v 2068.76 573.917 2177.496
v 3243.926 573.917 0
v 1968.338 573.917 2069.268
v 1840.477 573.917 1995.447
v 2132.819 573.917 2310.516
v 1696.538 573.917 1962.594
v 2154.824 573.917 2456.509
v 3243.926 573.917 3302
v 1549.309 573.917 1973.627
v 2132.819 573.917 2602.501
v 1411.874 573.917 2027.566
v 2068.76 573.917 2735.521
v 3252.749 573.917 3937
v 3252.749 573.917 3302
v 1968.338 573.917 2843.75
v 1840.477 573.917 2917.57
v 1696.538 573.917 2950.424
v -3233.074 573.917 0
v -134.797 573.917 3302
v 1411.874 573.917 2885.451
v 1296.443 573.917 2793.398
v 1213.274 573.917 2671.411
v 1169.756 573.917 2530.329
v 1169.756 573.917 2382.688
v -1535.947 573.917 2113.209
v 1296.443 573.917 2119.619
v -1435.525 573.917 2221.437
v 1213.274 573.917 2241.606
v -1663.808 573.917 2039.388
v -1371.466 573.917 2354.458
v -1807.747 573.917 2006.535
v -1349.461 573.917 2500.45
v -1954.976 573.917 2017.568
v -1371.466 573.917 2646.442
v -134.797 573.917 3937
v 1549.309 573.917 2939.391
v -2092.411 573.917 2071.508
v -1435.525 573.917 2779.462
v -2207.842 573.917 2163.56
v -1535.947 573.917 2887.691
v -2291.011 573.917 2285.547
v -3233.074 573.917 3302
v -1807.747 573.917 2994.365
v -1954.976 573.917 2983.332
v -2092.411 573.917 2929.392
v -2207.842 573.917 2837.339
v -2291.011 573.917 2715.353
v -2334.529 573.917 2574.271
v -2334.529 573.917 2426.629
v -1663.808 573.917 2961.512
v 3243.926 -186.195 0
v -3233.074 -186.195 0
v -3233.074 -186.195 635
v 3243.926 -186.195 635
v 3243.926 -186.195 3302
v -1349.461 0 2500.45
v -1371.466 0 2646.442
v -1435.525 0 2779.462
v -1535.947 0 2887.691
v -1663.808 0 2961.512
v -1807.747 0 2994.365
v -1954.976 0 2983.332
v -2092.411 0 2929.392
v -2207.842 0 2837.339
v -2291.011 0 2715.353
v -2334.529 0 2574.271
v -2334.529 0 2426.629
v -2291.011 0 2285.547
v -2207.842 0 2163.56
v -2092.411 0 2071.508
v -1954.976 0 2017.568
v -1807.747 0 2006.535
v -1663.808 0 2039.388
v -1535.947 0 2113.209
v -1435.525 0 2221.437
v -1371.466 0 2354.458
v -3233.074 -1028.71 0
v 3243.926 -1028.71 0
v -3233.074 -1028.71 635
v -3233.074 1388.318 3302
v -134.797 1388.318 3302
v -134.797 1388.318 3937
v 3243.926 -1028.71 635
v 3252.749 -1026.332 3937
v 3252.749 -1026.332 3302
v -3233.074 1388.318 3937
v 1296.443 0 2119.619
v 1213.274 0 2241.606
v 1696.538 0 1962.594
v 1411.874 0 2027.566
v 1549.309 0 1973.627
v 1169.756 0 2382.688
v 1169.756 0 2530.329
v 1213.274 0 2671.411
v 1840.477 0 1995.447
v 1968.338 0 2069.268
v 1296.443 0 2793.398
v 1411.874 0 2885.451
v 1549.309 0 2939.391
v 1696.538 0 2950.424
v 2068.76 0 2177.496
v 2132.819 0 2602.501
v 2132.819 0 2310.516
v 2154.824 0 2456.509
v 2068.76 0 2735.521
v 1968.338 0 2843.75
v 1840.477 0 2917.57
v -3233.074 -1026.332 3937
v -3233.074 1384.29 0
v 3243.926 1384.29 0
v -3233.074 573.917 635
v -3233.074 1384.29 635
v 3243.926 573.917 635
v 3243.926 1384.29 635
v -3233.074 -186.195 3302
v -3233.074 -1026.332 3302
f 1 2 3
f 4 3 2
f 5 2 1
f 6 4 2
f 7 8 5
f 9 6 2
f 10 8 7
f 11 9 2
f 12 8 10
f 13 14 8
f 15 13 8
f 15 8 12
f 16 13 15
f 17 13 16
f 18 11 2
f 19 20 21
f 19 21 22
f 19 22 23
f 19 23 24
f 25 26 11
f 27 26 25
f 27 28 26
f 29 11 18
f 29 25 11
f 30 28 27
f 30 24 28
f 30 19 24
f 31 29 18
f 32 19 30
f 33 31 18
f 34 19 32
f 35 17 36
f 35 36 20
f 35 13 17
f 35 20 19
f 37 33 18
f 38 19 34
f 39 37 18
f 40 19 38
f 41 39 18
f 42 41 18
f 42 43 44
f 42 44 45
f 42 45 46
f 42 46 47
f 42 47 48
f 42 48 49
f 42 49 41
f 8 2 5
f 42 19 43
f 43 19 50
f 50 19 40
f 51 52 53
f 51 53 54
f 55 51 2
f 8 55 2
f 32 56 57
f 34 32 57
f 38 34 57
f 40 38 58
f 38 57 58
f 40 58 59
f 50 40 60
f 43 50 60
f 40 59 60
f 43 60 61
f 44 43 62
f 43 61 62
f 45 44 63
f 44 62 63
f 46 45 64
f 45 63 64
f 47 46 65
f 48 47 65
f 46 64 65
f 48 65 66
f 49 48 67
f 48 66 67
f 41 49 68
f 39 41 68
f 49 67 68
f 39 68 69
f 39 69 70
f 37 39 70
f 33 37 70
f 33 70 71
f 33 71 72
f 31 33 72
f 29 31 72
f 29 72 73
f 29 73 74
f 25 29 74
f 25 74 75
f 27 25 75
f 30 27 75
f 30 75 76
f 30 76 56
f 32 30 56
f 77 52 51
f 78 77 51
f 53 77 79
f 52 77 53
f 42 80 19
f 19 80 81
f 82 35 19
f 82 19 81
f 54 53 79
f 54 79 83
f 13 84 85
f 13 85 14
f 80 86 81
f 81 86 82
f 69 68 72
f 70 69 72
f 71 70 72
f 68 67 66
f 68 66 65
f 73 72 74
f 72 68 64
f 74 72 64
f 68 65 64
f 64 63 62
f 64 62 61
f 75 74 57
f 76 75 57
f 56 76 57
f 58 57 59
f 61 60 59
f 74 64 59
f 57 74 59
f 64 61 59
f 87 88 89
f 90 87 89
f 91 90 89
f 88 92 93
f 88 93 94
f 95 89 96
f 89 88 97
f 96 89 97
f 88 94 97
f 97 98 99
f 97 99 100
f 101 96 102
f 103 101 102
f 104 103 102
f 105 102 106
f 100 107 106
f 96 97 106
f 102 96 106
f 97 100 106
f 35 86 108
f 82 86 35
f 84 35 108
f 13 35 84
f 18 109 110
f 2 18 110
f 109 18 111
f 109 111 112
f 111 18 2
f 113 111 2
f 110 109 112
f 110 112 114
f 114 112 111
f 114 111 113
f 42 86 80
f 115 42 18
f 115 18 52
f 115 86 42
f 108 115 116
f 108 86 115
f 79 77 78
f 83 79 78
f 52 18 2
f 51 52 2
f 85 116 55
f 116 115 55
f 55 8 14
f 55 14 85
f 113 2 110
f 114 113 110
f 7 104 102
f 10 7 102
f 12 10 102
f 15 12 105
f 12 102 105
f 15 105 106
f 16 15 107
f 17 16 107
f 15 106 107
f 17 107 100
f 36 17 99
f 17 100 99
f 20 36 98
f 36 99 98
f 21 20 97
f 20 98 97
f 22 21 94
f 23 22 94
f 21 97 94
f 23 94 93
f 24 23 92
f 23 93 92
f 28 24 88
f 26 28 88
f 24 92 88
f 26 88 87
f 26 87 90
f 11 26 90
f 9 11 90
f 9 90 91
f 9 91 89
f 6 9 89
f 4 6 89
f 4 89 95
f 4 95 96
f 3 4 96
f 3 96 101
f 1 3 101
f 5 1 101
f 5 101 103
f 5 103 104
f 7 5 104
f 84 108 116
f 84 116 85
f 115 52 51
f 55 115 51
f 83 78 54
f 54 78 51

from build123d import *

# Parameters (mm, degrees)
F0_W     = 6477
F0_H     = 810.3734621661
F1_DEPTH = 635
F0_H_2   = 842.5146396501
F0_H_3   = 760.1118981838
F2_DEPTH = 3937
F4_D     = 990.6
F4_DEPTH = 573.9180312881
F5_W     = 3098.277001664
F5_H     = 760.1118981838
F5_H_2   = 814.401268959
F6_DEPTH = 635


with BuildPart() as f1:
    # F0 (on Top) → F1 (new body)
    with BuildSketch(Plane.XY):
        with Locations((5.4263640195, 979.1037623712)):
            Rectangle(F0_W, F0_H)
    extrude(amount=F1_DEPTH)


with BuildPart() as f1b:
    # F0 (on Top) → F1, piece 2 (new body)
    with BuildSketch(Plane.XY):
        with Locations((5.4263640195, -607.4521867207)):
            Rectangle(F0_W, F0_H_2)
    extrude(amount=F1_DEPTH)


with BuildPart() as f2:
    # F0 (on Top) → F2 (new body)
    with BuildSketch(Plane.XY):
        with Locations((5.4263640195, 193.8610821962)):
            Rectangle(F0_W, F0_H_3)
    extrude(amount=F2_DEPTH)

    # F4 (through all, one way)
    with BuildSketch(Plane.XZ):
        with Locations((-1844.7613119429, 2500.4498958588), (1659.5237880488, 2456.5087053924)):
            Circle(F4_D / 2)
    extrude(amount=-F4_DEPTH, mode=Mode.SUBTRACT)

    # F5 (on face) → F6 (join)
    with BuildSketch(Plane.XY.offset(3937)):
        Polygon((3252.7485787868, -1026.3323783875), (3252.7485787868, 573.9170312881), (-134.7966343164, 573.9170312881), (-134.7966343164, -186.1948668957), (-3233.0736359805, -186.1948668957), (-3233.0736359805, -1026.3323783875), align=None)
        with Locations((-1683.9351351485, 193.8610821962)):
            Rectangle(F5_W, F5_H)
        with Locations((-1683.9351351485, 981.1176657677)):
            Rectangle(F5_W, F5_H_2)
    extrude(amount=-F6_DEPTH)


solid = Compound([f1.part, f1b.part, f2.part])
